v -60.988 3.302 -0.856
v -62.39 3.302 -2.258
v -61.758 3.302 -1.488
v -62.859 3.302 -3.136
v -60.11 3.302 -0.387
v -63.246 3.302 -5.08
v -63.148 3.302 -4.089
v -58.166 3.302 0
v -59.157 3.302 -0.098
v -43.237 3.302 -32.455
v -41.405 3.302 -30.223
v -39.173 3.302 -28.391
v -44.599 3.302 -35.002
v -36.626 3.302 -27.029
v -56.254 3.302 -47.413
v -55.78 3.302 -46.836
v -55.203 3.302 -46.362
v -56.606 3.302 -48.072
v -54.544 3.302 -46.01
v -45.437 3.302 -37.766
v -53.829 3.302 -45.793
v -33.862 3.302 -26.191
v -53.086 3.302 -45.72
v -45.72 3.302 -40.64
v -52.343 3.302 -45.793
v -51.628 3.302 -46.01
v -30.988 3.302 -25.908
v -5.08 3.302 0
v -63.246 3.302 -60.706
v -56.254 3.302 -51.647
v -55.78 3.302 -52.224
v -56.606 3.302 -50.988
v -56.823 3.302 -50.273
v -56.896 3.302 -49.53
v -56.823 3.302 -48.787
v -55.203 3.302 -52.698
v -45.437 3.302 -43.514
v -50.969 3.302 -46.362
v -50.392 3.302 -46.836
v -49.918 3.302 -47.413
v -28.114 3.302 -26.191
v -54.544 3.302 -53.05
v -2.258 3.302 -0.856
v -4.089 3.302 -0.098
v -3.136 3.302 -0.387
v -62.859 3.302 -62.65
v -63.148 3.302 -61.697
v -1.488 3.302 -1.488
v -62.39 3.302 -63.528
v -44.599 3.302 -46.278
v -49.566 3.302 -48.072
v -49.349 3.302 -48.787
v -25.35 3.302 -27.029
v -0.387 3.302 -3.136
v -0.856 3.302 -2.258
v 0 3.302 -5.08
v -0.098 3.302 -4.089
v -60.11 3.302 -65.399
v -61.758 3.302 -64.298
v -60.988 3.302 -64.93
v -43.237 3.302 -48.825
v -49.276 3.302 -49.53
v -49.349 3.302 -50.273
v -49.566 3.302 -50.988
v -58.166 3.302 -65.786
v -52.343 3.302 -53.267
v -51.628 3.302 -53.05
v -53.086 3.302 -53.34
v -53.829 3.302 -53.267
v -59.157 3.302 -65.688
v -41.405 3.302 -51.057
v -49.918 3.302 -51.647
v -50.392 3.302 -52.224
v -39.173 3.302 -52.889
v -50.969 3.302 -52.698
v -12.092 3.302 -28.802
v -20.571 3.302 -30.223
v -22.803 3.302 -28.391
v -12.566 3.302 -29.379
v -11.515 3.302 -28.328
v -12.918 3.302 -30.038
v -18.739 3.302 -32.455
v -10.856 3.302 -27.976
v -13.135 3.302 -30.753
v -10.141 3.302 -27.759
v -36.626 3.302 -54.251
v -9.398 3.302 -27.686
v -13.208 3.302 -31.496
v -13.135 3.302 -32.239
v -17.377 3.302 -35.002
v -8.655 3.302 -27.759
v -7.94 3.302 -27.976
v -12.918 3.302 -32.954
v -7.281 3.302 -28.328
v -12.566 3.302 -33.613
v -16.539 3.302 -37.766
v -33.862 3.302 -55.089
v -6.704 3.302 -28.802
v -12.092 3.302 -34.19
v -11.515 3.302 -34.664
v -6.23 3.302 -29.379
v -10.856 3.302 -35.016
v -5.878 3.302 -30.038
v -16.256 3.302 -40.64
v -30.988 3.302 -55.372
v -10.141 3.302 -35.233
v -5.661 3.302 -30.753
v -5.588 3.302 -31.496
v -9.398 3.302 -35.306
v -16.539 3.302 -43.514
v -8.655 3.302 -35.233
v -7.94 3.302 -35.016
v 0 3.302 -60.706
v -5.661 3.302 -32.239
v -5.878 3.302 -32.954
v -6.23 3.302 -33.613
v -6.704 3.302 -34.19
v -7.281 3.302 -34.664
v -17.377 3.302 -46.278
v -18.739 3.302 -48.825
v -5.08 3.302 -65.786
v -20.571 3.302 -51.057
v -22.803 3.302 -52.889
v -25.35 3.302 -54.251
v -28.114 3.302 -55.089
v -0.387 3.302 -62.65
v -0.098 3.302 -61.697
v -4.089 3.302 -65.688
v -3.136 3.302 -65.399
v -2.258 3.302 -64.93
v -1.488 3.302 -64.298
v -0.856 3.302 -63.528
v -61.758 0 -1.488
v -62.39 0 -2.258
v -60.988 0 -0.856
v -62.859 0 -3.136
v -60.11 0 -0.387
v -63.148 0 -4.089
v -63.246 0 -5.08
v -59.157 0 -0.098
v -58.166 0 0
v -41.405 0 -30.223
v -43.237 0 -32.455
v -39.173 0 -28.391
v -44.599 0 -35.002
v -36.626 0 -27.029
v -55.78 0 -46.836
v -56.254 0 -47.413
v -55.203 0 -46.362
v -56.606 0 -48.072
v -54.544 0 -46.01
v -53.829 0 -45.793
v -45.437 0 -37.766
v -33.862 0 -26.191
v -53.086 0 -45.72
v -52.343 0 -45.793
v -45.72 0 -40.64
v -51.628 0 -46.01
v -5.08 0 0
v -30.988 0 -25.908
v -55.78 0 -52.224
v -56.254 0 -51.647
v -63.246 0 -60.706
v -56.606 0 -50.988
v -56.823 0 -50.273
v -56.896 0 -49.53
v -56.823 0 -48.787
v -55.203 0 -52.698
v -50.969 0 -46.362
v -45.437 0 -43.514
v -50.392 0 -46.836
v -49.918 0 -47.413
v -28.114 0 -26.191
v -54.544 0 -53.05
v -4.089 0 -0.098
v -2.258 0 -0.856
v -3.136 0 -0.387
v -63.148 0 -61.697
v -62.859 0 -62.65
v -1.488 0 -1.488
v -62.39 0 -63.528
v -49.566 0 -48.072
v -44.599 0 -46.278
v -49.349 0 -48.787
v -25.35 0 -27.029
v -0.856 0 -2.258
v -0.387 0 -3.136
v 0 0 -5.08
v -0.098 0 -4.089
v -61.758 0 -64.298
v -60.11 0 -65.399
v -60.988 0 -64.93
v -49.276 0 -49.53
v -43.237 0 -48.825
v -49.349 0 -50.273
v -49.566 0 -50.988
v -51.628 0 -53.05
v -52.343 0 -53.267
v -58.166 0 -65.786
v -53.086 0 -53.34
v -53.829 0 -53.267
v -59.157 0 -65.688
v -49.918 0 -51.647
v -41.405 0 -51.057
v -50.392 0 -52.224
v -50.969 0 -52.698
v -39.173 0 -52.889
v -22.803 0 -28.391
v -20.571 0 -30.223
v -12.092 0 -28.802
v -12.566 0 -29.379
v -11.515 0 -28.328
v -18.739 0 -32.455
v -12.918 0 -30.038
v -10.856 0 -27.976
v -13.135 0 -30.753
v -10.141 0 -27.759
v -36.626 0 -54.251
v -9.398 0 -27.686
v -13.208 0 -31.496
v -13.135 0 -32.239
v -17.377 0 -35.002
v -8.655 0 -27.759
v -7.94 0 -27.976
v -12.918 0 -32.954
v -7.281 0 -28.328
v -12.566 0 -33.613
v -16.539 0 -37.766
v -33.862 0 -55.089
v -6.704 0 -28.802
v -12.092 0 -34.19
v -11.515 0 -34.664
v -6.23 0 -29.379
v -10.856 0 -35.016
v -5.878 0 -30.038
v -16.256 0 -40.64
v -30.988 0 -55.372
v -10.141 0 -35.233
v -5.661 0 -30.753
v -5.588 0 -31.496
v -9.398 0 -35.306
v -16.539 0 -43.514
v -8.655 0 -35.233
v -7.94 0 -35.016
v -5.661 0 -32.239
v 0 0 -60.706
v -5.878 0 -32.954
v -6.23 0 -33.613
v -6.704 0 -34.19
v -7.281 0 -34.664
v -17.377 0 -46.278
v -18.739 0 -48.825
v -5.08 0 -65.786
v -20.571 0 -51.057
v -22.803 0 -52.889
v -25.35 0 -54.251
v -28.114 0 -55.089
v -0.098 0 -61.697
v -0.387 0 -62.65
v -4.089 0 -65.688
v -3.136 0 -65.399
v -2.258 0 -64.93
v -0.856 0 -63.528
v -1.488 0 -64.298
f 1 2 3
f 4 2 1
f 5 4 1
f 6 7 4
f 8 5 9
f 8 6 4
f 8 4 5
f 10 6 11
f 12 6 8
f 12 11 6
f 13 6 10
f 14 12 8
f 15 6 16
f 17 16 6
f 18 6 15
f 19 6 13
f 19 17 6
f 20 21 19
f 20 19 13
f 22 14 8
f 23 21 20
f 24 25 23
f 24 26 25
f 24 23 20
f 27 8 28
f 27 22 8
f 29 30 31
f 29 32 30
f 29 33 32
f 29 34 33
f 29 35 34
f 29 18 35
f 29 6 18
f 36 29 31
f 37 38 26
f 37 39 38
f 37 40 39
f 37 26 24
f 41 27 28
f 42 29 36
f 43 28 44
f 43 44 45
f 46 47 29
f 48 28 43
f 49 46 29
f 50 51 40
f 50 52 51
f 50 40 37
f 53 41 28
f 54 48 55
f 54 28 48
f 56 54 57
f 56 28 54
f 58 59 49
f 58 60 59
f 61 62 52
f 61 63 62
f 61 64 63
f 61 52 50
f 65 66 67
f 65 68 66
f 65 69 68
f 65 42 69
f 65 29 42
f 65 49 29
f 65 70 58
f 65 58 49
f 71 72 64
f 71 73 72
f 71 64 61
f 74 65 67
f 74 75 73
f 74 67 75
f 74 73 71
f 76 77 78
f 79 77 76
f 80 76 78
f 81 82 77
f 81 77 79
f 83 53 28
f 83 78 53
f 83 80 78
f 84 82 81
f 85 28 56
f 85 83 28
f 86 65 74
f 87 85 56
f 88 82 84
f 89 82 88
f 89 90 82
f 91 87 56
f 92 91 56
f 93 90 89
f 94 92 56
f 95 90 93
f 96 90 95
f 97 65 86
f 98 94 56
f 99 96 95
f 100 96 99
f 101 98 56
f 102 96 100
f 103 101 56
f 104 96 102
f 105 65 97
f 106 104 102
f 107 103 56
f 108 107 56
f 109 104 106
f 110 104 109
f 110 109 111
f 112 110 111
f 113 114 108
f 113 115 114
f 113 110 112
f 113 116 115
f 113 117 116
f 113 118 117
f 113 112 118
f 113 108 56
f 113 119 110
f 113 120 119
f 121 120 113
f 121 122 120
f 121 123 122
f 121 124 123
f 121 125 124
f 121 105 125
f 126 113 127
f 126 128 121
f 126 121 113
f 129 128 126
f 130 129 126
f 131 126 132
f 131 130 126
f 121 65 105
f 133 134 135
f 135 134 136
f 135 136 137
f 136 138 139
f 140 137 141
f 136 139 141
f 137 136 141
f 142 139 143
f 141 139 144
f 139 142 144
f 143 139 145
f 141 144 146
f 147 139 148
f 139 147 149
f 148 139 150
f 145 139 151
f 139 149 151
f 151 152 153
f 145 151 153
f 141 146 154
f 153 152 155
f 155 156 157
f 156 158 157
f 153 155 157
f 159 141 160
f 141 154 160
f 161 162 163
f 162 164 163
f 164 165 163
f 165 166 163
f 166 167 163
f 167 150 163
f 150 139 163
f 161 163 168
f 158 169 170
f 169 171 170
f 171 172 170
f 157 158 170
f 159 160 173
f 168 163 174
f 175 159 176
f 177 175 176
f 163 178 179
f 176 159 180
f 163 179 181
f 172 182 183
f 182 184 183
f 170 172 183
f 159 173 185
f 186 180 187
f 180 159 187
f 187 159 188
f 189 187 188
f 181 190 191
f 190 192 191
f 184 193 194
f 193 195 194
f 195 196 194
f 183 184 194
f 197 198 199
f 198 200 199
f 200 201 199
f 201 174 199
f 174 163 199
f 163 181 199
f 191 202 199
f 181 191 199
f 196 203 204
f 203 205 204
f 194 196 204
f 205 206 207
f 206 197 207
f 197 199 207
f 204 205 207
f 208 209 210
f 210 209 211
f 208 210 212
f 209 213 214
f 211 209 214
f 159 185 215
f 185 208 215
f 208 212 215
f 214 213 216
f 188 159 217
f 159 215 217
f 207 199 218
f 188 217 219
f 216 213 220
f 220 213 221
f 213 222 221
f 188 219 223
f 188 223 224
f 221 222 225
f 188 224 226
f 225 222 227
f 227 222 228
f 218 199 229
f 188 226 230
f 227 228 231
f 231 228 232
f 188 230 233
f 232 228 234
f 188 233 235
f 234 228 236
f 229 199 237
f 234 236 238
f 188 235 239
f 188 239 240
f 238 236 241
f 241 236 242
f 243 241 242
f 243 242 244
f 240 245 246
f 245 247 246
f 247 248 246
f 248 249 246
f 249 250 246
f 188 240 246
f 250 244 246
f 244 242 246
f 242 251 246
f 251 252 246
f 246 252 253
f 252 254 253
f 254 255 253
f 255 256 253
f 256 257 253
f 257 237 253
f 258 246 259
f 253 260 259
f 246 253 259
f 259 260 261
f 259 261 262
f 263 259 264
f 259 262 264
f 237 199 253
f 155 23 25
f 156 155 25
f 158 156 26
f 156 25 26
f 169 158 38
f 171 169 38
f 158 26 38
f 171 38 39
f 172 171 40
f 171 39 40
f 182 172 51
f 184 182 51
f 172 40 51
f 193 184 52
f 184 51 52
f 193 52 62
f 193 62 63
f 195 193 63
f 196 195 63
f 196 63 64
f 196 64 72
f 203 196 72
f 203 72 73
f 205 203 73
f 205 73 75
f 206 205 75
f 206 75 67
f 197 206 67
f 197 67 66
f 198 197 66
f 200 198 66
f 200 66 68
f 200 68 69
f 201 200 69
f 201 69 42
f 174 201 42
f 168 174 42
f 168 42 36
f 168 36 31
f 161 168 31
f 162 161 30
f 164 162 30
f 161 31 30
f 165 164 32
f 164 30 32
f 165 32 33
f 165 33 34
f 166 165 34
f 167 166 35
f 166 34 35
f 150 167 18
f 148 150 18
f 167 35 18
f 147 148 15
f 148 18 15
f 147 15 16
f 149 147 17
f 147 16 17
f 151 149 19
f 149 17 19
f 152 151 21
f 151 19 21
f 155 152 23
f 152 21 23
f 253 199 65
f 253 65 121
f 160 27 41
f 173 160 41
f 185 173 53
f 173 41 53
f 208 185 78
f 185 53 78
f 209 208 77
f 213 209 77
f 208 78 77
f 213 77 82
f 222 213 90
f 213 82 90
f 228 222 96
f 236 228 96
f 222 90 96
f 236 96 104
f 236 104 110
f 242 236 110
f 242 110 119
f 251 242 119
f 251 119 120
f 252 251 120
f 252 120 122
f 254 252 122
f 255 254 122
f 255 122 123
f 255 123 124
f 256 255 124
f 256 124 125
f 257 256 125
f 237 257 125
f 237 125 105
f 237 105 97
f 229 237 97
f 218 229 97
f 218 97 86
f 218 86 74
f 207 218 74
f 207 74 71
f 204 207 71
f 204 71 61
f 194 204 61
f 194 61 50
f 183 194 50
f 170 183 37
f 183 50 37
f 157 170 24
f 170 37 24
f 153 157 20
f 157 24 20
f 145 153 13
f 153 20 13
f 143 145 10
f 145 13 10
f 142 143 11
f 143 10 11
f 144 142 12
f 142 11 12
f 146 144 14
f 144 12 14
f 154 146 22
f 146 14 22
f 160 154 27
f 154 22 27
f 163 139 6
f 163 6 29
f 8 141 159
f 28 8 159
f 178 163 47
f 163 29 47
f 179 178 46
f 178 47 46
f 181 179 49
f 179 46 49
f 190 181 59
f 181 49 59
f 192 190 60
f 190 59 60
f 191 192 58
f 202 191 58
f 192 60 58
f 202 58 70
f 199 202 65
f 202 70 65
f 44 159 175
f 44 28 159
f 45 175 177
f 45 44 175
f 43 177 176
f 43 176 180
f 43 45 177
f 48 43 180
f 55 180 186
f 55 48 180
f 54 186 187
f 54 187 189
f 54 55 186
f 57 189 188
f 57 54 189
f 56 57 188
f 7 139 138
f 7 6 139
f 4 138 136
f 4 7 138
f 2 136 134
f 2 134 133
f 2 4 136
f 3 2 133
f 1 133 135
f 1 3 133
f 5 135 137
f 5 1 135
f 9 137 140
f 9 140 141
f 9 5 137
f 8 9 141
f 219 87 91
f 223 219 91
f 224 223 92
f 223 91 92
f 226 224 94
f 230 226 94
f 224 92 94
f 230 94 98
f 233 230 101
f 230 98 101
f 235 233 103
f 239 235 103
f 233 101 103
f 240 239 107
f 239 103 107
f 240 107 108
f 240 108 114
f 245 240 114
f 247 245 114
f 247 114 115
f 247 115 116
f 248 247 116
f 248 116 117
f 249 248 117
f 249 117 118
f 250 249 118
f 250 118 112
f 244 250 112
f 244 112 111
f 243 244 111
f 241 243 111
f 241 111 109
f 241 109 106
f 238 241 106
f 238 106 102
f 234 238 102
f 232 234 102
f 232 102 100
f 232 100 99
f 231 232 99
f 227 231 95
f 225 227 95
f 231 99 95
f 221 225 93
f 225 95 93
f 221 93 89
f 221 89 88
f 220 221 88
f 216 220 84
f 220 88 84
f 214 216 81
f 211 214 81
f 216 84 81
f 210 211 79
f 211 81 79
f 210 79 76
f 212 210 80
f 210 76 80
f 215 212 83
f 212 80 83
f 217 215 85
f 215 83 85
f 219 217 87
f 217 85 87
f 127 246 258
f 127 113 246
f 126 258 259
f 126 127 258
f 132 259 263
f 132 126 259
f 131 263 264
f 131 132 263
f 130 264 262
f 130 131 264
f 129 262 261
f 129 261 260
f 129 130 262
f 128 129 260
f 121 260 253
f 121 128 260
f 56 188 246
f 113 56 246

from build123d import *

# Parameters (mm, degrees)
SKETCH1_W           = 63.246
SKETCH1_H           = 65.786
BOSS_EXTRUDE1_DEPTH = 3.302
FILLET2_R           = 5.08
SKETCH2_R           = 14.732
SKETCH2_R_2         = 3.81
CUT_EXTRUDE1_DEPTH  = 9.652


with BuildPart() as part:
    # Sketch1 → Boss-Extrude1 (new body)
    with BuildSketch(Plane(origin=(0, 0, 0), x_dir=(1, 0, 0), z_dir=(0, 1, 0))):
        with Locations((-31.623, 32.893)):
            Rectangle(SKETCH1_W, SKETCH1_H)
    extrude(amount=BOSS_EXTRUDE1_DEPTH)

    # Fillet2
    fillet2_edges = [part.edges().sort_by_distance(p)[0] for p in [
        (0, 1.651, 0),
        (-63.246, 1.651, 0),
        (-63.246, 1.651, -65.786),
        (0, 1.651, -65.786),
    ]]
    fillet(fillet2_edges, radius=FILLET2_R)

    # Sketch2 → Cut-Extrude1 (cut)
    with BuildSketch(Plane(origin=(0, 3.302, 0), x_dir=(1, 0, 0), z_dir=(0, 1, 0))):
        with Locations(Location((-30.988, 40.64, 0), (0, 0, 270))):
            Circle(SKETCH2_R)
        with Locations(Location((-53.086, 49.53, 0), (0, 0, 270))):
            Circle(SKETCH2_R_2)
        with Locations(Location((-9.398, 31.496, 0), (0, 0, 270))):
            Circle(SKETCH2_R_2)
    extrude(amount=-CUT_EXTRUDE1_DEPTH, mode=Mode.SUBTRACT)


solid = part.part
